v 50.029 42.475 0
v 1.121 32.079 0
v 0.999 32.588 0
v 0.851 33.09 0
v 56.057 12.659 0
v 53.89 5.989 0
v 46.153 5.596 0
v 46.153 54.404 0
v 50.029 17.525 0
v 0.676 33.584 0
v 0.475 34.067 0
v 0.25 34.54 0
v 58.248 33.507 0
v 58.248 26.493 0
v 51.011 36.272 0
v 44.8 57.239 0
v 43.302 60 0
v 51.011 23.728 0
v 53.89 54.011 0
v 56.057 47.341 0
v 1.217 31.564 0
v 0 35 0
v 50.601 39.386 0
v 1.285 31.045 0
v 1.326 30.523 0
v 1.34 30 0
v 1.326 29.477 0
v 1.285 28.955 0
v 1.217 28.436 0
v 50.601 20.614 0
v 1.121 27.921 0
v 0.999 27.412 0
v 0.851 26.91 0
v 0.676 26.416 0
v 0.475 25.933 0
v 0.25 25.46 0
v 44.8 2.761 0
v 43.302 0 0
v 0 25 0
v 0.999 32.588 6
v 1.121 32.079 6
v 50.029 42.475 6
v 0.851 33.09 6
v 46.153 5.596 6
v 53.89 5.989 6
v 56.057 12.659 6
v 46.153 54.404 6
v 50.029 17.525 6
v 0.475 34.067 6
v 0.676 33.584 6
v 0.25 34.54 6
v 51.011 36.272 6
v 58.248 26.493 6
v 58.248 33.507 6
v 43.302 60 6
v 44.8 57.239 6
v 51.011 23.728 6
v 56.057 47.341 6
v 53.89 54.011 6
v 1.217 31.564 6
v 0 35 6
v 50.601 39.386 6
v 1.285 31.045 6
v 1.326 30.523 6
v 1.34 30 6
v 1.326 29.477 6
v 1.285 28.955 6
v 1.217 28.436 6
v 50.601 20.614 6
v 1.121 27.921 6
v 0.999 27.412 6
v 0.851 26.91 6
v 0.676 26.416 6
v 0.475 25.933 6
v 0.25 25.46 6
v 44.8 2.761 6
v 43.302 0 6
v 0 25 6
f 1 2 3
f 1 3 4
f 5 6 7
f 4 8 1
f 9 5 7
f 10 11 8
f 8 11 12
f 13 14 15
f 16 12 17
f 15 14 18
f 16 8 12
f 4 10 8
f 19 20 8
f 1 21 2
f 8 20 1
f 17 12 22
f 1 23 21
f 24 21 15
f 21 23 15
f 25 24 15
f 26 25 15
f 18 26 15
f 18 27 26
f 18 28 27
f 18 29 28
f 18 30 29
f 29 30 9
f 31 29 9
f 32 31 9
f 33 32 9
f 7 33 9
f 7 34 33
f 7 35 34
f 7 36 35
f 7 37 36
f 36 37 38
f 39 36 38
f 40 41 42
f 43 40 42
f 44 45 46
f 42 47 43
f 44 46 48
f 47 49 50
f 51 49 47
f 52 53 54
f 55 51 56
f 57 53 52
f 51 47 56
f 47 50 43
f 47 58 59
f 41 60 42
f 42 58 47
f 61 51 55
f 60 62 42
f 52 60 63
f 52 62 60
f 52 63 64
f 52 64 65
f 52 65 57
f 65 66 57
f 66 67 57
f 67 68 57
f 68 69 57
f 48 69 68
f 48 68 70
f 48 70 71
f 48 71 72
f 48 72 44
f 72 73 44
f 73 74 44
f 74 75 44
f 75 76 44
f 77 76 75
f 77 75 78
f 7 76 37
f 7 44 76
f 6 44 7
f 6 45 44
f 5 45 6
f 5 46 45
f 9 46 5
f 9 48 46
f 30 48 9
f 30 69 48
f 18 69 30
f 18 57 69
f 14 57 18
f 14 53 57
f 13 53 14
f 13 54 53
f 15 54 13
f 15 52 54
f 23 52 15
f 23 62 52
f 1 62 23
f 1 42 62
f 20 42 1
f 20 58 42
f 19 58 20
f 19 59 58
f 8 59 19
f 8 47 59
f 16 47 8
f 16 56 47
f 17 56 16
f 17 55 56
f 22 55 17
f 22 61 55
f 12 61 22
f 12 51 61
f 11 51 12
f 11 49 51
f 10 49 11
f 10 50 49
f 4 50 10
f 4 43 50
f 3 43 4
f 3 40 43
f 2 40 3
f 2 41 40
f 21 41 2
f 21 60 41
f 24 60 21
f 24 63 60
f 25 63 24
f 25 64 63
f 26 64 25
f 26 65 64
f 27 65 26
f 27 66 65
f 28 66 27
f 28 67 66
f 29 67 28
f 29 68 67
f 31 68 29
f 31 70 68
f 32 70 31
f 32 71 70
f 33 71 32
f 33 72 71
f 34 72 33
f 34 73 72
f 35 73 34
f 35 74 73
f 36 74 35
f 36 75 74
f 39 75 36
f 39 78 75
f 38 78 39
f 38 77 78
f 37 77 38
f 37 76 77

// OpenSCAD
$fn = 32;

// ----------------------------------------------------------------------
// Gear sector: 3 teeth on 60 degrees
// ----------------------------------------------------------------------

// --- parameters (mm) ---
sector_angle = 60;        // sector angle, degrees
root_r = 60;              // root circle radius
tooth_h = 7;              // tooth height over the root circle
teeth = 3;                // number of teeth on the sector
hub_r = 10;               // hub bore radius
plate_t = 6;              // sector thickness, Z
arc_step = 3;             // sampling step of the root/hub arcs, degrees

tip_r = root_r + tooth_h;  // tip circle radius

profile = [[43.302, 0], [44.8, 2.761], [46.153, 5.596], [53.89, 5.989], [56.057, 12.659], [50.029, 17.525], [50.601, 20.614], [51.011, 23.728], [58.248, 26.493], [58.248, 33.507], [51.011, 36.272], [50.601, 39.386], [50.029, 42.475], [56.057, 47.341], [53.89, 54.011], [46.153, 54.404], [44.8, 57.239], [43.302, 60], [0, 35], [0.25, 34.54], [0.475, 34.067], [0.676, 33.584], [0.851, 33.09], [0.999, 32.588], [1.121, 32.079], [1.217, 31.564], [1.285, 31.045], [1.326, 30.523], [1.34, 30], [1.326, 29.477], [1.285, 28.955], [1.217, 28.436], [1.121, 27.921], [0.999, 27.412], [0.851, 26.91], [0.676, 26.416], [0.475, 25.933], [0.25, 25.46], [0, 25]];  // primary outline, 39 points, counter clockwise

// --- the one profile operation ---
linear_extrude(height = plate_t) polygon(points = profile);
